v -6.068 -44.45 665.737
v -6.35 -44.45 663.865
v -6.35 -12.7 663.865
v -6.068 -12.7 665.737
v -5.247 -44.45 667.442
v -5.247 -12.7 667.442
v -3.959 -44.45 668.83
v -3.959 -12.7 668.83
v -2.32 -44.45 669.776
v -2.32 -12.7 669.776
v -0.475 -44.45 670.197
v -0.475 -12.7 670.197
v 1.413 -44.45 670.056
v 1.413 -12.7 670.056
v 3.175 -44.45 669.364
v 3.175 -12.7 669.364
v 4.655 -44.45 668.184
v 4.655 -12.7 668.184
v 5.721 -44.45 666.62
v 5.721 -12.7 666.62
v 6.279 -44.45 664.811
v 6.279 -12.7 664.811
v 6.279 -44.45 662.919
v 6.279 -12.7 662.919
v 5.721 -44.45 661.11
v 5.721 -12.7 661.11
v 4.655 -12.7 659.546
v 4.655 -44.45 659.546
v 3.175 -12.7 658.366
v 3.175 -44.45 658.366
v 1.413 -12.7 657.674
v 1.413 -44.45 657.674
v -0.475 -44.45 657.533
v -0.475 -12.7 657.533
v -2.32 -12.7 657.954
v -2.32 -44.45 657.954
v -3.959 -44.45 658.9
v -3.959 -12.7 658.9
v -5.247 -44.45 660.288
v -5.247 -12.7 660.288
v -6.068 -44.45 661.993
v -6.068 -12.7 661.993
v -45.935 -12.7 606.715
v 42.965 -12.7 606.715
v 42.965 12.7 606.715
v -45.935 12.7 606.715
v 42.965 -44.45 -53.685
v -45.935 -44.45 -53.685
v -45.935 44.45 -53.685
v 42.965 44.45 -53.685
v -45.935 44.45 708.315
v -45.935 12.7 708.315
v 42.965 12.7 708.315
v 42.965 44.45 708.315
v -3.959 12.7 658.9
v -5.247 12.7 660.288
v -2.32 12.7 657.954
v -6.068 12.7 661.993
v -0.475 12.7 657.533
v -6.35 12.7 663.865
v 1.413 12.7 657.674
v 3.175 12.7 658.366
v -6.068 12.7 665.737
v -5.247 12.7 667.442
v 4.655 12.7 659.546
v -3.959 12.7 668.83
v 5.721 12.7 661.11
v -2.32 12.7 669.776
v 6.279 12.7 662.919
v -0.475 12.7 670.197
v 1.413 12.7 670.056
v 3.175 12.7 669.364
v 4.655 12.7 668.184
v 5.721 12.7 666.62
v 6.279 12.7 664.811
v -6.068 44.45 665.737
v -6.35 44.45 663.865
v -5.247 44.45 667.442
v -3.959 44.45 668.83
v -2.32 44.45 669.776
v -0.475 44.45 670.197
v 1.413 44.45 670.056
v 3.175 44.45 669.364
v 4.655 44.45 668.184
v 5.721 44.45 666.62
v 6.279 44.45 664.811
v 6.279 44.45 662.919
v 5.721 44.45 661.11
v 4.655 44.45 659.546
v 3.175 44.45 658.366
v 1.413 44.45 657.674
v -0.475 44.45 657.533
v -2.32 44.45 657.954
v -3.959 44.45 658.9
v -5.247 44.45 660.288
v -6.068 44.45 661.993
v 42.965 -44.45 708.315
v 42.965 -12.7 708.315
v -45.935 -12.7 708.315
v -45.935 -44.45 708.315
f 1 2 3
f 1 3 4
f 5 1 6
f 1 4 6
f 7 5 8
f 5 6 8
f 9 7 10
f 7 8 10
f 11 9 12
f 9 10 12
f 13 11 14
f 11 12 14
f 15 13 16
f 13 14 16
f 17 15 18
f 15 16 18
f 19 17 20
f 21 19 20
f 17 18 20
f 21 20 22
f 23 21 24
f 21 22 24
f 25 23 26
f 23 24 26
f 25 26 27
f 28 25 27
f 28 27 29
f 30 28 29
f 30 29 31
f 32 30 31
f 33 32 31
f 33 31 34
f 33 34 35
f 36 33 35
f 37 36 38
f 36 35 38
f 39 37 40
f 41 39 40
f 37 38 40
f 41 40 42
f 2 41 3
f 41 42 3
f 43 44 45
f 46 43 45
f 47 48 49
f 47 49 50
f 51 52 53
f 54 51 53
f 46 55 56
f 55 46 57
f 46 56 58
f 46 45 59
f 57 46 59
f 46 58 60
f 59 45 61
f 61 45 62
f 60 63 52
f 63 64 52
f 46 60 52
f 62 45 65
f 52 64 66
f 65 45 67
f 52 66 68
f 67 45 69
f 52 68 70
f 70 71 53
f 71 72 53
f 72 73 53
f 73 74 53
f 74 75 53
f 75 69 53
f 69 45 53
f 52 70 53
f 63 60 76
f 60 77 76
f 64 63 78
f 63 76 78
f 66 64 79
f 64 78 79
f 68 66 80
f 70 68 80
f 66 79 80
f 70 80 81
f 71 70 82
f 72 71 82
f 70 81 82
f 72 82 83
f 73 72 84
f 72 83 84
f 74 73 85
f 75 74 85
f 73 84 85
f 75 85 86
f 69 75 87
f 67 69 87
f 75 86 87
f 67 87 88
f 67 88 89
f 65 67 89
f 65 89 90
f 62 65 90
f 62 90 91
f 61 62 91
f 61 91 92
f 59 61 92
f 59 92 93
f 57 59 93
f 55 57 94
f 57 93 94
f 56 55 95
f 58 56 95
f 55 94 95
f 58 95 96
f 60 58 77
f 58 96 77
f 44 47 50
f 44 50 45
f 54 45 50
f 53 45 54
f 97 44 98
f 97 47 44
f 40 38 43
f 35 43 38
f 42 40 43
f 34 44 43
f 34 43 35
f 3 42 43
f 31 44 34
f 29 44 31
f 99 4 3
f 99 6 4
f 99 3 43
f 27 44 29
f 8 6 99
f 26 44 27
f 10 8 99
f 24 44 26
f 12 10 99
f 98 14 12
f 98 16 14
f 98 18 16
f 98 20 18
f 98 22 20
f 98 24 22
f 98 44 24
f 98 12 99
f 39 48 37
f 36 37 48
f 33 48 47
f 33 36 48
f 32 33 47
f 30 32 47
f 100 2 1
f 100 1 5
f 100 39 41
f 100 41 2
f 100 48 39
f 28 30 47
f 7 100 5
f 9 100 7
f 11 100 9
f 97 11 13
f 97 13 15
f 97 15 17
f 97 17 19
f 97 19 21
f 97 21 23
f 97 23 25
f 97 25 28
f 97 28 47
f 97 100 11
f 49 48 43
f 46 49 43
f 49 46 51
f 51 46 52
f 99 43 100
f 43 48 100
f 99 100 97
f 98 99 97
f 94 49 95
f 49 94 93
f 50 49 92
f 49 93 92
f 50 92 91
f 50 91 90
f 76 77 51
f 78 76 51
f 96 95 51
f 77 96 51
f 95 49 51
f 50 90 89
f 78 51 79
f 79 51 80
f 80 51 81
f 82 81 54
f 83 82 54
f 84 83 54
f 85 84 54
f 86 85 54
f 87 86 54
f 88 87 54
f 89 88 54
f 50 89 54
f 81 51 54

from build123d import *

# Parameters (mm, degrees)
F0_W     = 88.9
F0_H     = 762
F1_DEPTH = 44.45
F2_W     = 25.4
F2_H     = 101.6
F3_DEPTH = 127
F4_R     = 6.35
F5_DEPTH = 127


with BuildPart() as f1:
    # F0 (on Front) → F1 (new body, symmetric)
    with BuildSketch(Plane.XZ):
        with Locations((-1.4848271385, 327.3150383137)):
            Rectangle(F0_W, F0_H)
    extrude(amount=F1_DEPTH, both=True)

    # F2 (on Right) → F3 (cut, symmetric)
    with BuildSketch(Plane.YZ):
        with Locations((0, 657.5150383137)):
            Rectangle(F2_W, F2_H)
    extrude(amount=F3_DEPTH, both=True, mode=Mode.SUBTRACT)

    # F4 (on face) → F5 (cut, symmetric)
    with BuildSketch(Plane(origin=(0, 44.45, 0), x_dir=(-1, 0, 0), z_dir=(0, 1, 0))):
        with Locations((0, 663.8650383137)):
            Circle(F4_R)
    extrude(amount=F5_DEPTH, both=True, mode=Mode.SUBTRACT)


solid = f1.part
